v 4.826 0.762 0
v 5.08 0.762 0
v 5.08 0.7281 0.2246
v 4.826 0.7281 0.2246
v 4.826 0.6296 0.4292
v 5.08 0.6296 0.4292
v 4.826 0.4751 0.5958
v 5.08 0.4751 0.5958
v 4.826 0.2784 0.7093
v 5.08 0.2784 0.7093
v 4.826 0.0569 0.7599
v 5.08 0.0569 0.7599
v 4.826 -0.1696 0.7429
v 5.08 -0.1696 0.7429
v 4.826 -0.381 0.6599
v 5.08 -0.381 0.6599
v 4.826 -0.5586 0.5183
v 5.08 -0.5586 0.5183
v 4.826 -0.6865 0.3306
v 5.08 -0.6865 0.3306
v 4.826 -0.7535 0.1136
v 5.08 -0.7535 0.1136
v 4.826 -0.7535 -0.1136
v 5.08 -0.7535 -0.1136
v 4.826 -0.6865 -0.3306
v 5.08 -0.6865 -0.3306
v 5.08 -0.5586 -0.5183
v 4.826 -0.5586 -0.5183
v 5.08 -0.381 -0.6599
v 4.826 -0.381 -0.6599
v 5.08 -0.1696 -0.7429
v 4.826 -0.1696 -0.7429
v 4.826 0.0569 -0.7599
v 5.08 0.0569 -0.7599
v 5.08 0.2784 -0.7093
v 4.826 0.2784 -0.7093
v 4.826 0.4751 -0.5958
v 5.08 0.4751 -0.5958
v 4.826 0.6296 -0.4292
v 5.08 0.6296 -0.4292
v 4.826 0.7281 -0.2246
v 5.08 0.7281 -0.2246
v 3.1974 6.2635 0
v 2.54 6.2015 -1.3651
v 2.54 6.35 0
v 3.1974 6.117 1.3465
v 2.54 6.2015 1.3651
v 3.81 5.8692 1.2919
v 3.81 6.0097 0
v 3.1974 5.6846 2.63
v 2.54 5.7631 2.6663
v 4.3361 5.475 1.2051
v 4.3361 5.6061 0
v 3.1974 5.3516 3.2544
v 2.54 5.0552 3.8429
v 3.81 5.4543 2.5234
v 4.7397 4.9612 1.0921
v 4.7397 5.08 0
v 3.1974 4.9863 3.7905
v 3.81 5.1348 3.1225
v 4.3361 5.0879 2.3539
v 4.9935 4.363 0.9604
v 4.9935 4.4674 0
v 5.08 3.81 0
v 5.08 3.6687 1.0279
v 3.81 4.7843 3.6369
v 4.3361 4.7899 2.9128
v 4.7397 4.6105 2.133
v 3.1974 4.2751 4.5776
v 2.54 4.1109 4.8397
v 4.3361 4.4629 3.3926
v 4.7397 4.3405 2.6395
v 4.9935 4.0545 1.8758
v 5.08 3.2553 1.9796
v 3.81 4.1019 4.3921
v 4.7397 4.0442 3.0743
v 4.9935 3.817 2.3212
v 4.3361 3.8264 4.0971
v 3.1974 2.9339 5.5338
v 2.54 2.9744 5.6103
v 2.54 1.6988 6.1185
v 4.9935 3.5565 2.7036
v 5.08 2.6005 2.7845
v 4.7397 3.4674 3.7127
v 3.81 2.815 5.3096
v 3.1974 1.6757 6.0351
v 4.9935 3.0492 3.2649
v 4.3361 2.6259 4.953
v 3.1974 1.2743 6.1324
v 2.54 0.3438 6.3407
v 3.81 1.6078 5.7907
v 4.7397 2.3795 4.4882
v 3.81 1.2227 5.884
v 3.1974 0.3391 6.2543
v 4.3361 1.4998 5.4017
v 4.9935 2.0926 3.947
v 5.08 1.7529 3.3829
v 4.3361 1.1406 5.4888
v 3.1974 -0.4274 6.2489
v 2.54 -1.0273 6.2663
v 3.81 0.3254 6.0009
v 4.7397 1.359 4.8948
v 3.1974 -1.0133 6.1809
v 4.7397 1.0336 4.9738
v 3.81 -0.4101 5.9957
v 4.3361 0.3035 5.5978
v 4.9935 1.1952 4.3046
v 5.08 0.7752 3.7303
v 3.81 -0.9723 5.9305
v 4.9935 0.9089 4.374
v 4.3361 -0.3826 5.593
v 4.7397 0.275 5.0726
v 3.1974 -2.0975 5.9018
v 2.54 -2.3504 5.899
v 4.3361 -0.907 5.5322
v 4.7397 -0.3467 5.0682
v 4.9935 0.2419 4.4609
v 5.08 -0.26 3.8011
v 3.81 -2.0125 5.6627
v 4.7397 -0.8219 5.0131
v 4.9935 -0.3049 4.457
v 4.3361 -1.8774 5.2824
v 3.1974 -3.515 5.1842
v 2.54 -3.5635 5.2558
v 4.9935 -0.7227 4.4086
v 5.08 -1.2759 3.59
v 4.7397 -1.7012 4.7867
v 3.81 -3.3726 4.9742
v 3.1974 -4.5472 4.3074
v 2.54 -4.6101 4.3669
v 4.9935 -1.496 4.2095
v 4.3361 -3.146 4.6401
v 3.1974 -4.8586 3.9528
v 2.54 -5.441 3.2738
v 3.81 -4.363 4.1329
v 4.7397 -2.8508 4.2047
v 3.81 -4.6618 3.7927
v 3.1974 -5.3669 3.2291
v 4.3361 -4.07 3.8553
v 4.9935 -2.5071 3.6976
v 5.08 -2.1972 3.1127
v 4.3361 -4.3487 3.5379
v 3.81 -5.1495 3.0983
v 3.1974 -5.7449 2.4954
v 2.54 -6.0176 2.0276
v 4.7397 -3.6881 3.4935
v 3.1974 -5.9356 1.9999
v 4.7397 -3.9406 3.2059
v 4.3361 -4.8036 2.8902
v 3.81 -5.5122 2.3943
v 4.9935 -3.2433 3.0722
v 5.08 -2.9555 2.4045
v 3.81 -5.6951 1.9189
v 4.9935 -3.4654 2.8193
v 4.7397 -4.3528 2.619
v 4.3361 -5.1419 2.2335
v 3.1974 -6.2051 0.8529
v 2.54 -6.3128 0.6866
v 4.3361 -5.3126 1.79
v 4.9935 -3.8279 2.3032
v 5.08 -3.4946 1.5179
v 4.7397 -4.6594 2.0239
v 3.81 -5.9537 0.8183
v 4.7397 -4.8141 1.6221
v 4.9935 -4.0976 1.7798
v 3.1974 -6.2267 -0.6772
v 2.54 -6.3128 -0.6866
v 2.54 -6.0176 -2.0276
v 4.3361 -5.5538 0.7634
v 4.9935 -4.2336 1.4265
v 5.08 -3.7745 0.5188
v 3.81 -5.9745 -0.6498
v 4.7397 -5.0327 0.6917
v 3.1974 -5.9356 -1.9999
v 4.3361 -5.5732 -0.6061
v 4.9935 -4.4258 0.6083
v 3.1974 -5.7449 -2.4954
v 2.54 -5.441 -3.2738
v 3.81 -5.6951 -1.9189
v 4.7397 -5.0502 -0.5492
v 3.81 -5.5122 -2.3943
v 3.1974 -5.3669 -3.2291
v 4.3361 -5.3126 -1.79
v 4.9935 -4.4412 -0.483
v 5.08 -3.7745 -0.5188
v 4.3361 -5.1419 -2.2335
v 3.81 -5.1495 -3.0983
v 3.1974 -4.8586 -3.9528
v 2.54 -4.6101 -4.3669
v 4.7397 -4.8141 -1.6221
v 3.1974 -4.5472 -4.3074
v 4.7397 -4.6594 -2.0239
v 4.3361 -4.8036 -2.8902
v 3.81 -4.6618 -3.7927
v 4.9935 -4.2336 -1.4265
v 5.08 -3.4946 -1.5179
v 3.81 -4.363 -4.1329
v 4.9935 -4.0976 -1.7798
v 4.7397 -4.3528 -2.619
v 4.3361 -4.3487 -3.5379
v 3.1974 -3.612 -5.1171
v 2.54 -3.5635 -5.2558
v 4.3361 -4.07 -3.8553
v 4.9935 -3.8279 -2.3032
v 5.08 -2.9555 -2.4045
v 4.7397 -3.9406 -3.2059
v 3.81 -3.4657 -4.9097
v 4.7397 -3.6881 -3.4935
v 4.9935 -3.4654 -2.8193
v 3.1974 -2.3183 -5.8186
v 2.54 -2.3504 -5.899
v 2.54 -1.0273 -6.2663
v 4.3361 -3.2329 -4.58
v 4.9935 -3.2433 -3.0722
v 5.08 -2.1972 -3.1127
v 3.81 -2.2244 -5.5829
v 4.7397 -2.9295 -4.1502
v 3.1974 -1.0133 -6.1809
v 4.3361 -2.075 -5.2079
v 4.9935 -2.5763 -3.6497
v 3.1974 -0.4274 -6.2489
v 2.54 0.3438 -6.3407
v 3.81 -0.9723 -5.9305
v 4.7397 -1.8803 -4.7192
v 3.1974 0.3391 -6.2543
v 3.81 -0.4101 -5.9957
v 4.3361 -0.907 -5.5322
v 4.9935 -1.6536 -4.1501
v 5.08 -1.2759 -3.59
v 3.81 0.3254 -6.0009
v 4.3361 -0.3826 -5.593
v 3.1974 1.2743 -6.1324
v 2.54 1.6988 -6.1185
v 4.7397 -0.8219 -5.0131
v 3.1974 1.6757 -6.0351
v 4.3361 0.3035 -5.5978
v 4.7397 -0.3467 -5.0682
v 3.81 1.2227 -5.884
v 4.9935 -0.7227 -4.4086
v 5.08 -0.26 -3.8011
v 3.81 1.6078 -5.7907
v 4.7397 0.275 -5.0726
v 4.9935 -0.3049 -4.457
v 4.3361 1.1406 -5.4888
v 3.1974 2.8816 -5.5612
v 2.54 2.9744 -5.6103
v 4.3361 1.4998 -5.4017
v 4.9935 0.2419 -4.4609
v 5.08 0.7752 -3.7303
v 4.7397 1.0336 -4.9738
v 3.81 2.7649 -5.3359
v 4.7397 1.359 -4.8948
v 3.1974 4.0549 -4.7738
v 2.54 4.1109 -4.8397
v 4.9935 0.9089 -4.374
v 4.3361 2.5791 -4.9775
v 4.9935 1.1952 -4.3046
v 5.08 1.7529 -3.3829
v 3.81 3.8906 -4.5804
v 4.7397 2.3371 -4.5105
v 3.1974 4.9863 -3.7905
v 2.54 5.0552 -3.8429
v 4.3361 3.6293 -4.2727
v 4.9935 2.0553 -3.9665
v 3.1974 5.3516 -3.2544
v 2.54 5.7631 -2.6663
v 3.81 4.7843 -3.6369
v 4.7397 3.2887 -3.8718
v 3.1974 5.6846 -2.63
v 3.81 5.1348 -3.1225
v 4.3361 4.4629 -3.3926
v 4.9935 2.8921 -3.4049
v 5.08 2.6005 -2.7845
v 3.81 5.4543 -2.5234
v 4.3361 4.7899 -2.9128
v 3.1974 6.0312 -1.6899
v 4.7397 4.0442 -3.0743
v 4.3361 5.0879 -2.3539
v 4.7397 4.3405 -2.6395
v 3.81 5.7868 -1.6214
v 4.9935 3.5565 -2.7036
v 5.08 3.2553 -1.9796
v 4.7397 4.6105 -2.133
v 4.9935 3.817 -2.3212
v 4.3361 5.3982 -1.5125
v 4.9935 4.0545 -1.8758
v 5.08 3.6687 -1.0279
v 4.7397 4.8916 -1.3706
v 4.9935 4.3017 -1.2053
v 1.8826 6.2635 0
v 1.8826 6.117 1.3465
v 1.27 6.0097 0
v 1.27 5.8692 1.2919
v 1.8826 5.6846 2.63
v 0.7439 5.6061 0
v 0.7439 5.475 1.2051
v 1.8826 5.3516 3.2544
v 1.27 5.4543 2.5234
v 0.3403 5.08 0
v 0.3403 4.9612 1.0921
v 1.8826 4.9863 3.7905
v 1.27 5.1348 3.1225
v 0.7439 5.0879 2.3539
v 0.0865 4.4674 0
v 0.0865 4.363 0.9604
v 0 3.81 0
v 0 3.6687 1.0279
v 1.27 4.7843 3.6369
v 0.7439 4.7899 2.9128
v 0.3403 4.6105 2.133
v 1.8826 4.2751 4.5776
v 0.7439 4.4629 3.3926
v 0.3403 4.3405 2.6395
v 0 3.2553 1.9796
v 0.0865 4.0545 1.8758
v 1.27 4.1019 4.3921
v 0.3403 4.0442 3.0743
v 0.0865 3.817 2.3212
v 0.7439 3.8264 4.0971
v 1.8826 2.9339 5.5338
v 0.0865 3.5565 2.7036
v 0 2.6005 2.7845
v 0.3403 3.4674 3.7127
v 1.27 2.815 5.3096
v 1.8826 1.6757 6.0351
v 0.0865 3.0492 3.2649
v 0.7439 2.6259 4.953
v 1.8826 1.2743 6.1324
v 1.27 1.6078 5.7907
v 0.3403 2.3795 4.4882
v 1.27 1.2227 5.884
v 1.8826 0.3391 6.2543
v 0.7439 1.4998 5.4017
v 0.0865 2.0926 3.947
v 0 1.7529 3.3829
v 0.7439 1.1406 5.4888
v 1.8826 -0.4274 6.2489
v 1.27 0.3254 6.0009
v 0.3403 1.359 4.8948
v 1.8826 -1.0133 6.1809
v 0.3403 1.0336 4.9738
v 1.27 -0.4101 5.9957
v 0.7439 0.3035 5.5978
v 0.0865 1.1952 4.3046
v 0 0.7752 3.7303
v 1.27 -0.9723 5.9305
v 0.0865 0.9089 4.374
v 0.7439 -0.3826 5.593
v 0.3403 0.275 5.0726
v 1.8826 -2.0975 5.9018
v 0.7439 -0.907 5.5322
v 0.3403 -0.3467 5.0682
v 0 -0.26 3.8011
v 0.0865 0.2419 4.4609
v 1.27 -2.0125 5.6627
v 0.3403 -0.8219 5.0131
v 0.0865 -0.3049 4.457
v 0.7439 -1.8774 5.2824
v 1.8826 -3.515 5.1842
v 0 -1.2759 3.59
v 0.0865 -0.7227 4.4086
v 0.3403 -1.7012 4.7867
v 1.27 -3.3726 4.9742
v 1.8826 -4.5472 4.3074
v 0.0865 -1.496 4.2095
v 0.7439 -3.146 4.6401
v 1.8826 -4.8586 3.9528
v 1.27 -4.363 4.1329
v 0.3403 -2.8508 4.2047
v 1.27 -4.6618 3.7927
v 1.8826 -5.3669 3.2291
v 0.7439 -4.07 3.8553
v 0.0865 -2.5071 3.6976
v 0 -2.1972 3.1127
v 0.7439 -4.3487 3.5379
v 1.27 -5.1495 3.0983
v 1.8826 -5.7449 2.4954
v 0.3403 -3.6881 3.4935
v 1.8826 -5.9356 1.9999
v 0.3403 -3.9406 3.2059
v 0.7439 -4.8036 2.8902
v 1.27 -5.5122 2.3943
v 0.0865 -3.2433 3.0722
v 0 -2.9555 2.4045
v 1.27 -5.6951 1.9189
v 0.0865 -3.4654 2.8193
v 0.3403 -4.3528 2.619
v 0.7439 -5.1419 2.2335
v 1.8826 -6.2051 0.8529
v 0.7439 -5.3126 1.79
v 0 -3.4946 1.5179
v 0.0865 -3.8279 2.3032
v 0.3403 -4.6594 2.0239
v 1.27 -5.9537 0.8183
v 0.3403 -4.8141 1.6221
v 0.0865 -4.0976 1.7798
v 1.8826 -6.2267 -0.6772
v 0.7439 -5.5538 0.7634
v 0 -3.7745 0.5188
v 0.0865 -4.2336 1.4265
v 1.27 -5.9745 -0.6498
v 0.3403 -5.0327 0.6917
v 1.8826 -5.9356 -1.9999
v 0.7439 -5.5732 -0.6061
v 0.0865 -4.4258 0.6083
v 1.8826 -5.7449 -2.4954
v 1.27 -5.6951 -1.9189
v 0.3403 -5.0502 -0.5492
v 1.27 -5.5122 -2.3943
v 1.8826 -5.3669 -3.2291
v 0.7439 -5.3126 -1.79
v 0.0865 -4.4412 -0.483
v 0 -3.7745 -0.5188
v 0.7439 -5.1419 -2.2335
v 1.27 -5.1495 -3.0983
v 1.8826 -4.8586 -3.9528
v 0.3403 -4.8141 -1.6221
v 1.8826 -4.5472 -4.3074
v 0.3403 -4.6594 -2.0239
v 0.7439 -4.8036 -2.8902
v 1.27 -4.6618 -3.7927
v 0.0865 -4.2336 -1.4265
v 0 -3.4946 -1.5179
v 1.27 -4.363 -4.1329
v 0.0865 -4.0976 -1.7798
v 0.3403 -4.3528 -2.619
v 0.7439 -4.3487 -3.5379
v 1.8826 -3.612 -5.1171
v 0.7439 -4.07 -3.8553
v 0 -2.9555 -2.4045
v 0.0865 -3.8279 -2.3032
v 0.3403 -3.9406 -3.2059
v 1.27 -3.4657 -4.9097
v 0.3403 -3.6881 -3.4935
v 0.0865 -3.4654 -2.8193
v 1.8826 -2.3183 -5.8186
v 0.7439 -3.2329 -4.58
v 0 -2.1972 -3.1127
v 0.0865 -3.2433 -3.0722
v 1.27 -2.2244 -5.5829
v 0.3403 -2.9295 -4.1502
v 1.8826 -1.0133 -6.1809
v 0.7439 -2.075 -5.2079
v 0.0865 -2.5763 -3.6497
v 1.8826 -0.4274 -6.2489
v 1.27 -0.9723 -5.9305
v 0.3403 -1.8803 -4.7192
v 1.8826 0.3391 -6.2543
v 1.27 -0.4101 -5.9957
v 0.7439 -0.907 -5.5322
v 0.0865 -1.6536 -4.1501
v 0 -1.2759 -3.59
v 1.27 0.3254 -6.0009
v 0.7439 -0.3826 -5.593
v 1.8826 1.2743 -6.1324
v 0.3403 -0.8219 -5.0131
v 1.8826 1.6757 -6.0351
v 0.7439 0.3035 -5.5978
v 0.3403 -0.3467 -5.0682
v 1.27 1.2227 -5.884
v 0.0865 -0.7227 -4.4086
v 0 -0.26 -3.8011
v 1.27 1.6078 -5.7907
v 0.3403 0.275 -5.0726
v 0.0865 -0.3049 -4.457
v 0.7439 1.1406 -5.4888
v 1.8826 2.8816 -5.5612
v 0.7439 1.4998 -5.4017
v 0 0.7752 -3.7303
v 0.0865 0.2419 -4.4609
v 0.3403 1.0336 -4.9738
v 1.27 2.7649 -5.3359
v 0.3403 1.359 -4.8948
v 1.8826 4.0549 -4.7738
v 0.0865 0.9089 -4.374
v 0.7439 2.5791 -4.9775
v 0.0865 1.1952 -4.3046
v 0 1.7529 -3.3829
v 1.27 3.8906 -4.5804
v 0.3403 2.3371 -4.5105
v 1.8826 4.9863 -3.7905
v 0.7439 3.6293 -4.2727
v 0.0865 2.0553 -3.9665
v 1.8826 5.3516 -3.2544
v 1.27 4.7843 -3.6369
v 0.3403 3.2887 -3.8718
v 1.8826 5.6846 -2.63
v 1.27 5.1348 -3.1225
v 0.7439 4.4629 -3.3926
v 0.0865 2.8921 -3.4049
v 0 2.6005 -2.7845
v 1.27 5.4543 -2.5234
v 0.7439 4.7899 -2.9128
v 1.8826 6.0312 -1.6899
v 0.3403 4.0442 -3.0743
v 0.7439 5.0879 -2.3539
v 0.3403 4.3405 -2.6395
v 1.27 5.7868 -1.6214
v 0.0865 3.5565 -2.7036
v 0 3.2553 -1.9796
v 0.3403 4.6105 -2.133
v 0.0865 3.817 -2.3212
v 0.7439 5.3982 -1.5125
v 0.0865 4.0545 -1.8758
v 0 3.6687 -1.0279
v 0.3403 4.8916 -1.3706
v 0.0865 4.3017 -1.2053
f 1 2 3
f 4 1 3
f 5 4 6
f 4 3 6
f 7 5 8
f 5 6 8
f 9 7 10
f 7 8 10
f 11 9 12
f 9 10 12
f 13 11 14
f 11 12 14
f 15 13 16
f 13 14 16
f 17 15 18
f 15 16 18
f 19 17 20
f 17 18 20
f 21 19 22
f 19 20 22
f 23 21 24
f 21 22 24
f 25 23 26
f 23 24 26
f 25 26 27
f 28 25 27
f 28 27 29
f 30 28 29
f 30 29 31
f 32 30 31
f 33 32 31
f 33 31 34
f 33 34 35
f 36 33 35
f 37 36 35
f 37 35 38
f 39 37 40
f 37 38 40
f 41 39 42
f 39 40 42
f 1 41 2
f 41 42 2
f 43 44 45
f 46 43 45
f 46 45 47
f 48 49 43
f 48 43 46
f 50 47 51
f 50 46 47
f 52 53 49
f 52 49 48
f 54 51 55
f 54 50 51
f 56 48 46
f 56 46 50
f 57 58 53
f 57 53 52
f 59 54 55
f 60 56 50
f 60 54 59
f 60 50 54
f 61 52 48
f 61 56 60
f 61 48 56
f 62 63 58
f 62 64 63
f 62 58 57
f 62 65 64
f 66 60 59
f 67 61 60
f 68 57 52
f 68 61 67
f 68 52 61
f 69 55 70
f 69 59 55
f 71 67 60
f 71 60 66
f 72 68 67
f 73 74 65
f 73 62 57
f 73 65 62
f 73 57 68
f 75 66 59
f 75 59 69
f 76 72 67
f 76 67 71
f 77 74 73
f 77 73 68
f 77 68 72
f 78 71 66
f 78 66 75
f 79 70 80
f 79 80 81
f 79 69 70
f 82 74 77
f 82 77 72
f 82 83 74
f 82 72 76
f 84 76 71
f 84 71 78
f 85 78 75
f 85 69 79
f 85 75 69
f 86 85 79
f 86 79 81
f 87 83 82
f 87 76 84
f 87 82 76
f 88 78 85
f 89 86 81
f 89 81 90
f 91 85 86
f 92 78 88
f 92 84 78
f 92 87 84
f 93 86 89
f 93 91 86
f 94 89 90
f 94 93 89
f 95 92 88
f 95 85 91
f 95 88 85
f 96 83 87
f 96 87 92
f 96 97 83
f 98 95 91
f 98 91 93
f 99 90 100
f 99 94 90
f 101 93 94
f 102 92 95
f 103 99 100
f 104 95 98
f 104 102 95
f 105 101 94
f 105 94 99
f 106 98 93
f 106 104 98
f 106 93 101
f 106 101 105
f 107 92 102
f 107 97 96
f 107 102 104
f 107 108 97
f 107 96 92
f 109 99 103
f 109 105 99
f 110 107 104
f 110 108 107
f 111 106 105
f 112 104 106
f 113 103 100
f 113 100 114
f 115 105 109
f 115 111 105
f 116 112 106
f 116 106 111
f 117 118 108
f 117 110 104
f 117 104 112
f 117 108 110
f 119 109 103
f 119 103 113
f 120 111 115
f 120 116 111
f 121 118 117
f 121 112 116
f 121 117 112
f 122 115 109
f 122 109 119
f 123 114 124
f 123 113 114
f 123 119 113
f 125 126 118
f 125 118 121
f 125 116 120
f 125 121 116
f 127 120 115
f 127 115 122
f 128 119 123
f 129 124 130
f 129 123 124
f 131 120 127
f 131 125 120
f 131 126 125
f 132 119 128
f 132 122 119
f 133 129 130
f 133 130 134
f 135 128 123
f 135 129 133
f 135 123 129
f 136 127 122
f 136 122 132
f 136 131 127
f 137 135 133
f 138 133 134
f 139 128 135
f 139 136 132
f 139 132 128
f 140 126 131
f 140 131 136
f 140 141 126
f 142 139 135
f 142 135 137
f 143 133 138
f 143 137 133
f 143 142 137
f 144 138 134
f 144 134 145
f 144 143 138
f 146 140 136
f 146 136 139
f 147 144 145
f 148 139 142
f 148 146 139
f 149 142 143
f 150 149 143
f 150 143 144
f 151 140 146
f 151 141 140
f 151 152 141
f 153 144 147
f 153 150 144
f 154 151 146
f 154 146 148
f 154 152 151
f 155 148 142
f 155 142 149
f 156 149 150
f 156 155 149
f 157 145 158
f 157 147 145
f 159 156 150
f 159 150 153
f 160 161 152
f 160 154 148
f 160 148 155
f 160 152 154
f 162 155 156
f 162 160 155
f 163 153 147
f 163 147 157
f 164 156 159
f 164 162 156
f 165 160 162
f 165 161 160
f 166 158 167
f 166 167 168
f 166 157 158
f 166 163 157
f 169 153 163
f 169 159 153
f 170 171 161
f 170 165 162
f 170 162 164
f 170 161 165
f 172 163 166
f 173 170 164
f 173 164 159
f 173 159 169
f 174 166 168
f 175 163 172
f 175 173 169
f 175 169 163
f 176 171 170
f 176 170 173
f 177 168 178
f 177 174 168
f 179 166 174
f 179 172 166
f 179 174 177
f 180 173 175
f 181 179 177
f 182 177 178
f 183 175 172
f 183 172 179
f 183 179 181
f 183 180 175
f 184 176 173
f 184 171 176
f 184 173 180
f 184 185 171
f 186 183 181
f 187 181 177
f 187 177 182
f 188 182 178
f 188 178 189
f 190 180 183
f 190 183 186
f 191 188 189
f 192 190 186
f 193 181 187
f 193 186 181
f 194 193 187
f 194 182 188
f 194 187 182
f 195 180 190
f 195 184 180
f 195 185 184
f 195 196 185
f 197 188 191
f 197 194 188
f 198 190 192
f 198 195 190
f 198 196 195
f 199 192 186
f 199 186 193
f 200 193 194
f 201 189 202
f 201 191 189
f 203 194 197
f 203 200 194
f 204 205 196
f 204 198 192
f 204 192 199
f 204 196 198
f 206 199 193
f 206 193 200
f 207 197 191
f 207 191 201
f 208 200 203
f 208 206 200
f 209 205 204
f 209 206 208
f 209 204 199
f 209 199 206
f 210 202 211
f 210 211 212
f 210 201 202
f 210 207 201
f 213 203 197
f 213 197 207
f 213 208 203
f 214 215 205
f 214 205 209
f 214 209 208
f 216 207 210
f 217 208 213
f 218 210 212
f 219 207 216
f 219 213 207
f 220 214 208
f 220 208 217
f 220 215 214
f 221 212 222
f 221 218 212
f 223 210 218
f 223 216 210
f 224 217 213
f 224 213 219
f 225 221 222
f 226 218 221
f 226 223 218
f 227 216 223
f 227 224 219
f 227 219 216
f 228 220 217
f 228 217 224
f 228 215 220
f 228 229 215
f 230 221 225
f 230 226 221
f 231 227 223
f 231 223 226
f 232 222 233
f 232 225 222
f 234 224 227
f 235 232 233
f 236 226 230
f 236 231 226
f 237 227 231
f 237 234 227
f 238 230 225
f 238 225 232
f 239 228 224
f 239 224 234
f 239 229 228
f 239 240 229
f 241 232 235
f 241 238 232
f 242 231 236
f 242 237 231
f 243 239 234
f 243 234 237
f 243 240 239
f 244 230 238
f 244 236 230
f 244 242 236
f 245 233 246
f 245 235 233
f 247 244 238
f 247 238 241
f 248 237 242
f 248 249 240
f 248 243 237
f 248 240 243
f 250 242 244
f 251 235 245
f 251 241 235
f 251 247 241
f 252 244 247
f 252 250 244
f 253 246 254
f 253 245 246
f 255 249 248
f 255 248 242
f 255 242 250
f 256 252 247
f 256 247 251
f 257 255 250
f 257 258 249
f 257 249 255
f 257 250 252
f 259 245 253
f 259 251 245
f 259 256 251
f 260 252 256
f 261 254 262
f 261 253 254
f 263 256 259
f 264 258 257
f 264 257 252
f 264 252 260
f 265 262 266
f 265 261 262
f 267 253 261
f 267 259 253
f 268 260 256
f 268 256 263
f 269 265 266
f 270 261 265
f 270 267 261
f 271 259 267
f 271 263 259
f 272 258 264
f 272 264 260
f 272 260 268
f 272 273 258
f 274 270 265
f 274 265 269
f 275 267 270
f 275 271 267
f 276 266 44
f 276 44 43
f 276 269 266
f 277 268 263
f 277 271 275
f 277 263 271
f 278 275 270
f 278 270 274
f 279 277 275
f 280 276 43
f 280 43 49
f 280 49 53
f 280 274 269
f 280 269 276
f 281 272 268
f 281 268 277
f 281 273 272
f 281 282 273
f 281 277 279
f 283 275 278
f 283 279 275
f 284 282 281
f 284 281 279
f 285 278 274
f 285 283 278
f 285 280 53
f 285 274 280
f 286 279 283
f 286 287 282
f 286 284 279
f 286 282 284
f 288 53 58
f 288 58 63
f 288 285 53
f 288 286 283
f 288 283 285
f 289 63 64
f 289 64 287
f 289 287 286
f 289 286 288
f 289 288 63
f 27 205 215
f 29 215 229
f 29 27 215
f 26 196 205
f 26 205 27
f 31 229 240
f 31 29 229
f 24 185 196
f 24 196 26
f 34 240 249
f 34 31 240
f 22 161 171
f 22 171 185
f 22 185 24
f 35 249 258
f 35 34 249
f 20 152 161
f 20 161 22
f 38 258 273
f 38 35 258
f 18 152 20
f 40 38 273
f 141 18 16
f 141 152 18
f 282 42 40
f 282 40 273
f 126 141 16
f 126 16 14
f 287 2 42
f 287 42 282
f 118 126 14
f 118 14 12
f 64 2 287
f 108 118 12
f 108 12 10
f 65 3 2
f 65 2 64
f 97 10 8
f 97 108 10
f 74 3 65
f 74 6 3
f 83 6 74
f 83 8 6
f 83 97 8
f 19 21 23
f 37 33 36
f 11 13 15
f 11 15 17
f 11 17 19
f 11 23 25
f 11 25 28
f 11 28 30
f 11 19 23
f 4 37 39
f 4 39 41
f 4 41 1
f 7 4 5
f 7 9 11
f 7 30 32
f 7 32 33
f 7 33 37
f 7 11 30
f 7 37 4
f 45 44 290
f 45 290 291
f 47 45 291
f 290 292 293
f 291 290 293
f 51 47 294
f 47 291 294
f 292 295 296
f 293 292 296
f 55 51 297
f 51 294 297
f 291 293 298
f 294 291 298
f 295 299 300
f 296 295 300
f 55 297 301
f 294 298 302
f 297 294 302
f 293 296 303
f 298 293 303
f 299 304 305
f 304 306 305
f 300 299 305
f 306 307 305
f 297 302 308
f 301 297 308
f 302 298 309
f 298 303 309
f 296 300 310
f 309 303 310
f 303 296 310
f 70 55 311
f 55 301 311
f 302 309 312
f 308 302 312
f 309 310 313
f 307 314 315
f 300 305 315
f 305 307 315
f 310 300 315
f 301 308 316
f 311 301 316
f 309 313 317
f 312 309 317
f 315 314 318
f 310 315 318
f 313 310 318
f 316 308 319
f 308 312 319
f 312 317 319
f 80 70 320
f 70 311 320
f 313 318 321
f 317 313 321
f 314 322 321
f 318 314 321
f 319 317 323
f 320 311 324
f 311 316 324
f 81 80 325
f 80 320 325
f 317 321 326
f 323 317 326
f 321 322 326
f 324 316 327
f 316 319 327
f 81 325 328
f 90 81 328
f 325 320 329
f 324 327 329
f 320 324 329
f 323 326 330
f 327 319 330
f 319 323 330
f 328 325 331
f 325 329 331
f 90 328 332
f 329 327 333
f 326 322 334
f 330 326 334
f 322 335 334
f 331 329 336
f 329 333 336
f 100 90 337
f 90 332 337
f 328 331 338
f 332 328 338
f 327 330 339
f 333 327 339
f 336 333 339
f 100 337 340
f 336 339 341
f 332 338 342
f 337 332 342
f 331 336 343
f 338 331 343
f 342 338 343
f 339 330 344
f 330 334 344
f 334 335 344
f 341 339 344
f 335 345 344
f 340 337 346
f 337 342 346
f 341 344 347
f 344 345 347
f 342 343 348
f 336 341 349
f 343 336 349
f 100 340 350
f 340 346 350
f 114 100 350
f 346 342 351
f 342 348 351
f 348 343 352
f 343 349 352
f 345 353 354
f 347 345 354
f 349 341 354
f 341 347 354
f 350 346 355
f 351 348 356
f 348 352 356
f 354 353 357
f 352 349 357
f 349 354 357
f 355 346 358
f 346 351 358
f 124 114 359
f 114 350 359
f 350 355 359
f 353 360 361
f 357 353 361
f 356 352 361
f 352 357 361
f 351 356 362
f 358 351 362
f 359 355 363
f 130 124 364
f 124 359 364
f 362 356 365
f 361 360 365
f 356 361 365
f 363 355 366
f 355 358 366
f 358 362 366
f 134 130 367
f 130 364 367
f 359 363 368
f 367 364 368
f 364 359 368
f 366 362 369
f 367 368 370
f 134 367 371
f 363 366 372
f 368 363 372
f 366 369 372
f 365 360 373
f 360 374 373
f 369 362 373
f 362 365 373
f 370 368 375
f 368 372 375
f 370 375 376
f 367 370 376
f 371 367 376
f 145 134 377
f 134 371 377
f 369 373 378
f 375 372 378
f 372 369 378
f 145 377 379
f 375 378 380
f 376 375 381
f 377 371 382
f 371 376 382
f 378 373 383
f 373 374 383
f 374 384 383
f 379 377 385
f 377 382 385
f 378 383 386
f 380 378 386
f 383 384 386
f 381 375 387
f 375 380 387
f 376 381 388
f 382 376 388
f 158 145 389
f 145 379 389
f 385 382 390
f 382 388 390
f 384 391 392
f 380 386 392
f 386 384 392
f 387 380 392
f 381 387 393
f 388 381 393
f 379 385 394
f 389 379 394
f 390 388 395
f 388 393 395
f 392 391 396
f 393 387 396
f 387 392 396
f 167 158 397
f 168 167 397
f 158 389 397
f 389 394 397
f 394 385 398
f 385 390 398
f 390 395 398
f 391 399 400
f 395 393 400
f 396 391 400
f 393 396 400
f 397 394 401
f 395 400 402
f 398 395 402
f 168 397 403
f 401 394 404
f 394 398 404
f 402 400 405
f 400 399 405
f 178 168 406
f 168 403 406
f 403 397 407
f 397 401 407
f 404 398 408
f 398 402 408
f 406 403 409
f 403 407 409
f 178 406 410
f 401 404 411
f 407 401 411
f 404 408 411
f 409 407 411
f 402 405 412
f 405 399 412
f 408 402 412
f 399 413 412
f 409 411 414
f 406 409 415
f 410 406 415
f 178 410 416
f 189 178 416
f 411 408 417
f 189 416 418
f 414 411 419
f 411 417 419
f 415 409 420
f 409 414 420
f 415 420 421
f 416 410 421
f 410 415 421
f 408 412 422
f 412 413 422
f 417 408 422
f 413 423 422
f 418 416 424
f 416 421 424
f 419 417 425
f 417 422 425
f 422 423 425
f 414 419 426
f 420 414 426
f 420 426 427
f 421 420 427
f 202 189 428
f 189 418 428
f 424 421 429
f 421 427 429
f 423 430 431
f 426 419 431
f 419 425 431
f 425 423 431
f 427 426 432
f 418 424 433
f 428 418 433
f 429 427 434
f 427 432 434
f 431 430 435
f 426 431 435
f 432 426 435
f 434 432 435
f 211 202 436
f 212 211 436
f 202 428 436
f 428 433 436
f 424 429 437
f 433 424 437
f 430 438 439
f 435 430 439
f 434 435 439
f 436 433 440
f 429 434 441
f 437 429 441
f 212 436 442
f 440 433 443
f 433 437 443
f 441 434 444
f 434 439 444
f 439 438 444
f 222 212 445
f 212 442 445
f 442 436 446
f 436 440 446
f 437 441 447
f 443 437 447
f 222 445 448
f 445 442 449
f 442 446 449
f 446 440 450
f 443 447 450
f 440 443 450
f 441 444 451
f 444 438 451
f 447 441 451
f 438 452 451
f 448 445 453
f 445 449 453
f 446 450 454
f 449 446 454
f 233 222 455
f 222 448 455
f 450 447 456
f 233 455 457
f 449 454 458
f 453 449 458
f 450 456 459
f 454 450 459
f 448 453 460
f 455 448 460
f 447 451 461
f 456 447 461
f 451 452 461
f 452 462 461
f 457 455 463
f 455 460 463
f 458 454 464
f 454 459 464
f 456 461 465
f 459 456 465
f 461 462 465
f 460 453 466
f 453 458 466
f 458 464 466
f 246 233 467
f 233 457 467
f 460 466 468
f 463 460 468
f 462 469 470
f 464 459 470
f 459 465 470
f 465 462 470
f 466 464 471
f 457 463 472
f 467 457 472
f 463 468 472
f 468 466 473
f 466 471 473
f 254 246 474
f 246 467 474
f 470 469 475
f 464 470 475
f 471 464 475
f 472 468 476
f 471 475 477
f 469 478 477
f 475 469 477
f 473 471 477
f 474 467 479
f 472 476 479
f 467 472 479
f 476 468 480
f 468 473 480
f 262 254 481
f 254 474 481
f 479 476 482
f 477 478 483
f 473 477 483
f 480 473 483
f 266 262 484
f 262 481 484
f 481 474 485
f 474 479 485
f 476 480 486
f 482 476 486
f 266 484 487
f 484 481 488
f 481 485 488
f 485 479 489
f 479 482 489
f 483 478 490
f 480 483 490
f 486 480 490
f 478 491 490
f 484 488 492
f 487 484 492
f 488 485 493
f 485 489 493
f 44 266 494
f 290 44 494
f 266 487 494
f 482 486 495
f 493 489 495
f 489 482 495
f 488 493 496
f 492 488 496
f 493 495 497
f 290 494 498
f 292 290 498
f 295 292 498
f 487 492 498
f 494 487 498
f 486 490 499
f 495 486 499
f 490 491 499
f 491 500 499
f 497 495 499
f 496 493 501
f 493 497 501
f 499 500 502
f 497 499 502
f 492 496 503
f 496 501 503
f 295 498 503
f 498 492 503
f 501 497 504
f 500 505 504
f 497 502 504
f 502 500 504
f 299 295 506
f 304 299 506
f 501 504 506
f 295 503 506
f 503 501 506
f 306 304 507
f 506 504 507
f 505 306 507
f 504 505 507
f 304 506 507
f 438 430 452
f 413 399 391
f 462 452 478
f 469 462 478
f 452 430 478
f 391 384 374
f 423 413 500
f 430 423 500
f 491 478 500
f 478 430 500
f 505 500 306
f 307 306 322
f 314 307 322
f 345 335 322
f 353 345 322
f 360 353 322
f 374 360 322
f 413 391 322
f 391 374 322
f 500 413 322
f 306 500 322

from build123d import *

# Parameters (mm, degrees)
F0_R     = 6.35
F1_DEPTH = 5.08
F2_R     = 2.53999
F3_R     = 0.762
F4_DEPTH = 0.254


# Not quite as in the source:
# - a fillet or chamfer is up to 0.001 mm smaller than in the source, because OpenCascade refuses the exact size


with BuildPart() as f1:
    # F0 (on Right) → F1 (new body)
    with BuildSketch(Plane.YZ):
        Circle(F0_R)
    extrude(amount=F1_DEPTH)

    # F2 (radius 2.54 in the source; OpenCascade refuses exactly that, so slightly less here)
    f2_edges = [f1.edges().sort_by_distance(p)[0] for p in [
        (5.08, -6.35, 0),
        (0, -6.35, 0),
    ]]
    fillet(f2_edges, radius=F2_R)

    # F3 (on face) → F4 (cut)
    with BuildSketch(Plane.YZ.offset(5.08)):
        Circle(F3_R)
    extrude(amount=-F4_DEPTH, mode=Mode.SUBTRACT)


solid = f1.part
